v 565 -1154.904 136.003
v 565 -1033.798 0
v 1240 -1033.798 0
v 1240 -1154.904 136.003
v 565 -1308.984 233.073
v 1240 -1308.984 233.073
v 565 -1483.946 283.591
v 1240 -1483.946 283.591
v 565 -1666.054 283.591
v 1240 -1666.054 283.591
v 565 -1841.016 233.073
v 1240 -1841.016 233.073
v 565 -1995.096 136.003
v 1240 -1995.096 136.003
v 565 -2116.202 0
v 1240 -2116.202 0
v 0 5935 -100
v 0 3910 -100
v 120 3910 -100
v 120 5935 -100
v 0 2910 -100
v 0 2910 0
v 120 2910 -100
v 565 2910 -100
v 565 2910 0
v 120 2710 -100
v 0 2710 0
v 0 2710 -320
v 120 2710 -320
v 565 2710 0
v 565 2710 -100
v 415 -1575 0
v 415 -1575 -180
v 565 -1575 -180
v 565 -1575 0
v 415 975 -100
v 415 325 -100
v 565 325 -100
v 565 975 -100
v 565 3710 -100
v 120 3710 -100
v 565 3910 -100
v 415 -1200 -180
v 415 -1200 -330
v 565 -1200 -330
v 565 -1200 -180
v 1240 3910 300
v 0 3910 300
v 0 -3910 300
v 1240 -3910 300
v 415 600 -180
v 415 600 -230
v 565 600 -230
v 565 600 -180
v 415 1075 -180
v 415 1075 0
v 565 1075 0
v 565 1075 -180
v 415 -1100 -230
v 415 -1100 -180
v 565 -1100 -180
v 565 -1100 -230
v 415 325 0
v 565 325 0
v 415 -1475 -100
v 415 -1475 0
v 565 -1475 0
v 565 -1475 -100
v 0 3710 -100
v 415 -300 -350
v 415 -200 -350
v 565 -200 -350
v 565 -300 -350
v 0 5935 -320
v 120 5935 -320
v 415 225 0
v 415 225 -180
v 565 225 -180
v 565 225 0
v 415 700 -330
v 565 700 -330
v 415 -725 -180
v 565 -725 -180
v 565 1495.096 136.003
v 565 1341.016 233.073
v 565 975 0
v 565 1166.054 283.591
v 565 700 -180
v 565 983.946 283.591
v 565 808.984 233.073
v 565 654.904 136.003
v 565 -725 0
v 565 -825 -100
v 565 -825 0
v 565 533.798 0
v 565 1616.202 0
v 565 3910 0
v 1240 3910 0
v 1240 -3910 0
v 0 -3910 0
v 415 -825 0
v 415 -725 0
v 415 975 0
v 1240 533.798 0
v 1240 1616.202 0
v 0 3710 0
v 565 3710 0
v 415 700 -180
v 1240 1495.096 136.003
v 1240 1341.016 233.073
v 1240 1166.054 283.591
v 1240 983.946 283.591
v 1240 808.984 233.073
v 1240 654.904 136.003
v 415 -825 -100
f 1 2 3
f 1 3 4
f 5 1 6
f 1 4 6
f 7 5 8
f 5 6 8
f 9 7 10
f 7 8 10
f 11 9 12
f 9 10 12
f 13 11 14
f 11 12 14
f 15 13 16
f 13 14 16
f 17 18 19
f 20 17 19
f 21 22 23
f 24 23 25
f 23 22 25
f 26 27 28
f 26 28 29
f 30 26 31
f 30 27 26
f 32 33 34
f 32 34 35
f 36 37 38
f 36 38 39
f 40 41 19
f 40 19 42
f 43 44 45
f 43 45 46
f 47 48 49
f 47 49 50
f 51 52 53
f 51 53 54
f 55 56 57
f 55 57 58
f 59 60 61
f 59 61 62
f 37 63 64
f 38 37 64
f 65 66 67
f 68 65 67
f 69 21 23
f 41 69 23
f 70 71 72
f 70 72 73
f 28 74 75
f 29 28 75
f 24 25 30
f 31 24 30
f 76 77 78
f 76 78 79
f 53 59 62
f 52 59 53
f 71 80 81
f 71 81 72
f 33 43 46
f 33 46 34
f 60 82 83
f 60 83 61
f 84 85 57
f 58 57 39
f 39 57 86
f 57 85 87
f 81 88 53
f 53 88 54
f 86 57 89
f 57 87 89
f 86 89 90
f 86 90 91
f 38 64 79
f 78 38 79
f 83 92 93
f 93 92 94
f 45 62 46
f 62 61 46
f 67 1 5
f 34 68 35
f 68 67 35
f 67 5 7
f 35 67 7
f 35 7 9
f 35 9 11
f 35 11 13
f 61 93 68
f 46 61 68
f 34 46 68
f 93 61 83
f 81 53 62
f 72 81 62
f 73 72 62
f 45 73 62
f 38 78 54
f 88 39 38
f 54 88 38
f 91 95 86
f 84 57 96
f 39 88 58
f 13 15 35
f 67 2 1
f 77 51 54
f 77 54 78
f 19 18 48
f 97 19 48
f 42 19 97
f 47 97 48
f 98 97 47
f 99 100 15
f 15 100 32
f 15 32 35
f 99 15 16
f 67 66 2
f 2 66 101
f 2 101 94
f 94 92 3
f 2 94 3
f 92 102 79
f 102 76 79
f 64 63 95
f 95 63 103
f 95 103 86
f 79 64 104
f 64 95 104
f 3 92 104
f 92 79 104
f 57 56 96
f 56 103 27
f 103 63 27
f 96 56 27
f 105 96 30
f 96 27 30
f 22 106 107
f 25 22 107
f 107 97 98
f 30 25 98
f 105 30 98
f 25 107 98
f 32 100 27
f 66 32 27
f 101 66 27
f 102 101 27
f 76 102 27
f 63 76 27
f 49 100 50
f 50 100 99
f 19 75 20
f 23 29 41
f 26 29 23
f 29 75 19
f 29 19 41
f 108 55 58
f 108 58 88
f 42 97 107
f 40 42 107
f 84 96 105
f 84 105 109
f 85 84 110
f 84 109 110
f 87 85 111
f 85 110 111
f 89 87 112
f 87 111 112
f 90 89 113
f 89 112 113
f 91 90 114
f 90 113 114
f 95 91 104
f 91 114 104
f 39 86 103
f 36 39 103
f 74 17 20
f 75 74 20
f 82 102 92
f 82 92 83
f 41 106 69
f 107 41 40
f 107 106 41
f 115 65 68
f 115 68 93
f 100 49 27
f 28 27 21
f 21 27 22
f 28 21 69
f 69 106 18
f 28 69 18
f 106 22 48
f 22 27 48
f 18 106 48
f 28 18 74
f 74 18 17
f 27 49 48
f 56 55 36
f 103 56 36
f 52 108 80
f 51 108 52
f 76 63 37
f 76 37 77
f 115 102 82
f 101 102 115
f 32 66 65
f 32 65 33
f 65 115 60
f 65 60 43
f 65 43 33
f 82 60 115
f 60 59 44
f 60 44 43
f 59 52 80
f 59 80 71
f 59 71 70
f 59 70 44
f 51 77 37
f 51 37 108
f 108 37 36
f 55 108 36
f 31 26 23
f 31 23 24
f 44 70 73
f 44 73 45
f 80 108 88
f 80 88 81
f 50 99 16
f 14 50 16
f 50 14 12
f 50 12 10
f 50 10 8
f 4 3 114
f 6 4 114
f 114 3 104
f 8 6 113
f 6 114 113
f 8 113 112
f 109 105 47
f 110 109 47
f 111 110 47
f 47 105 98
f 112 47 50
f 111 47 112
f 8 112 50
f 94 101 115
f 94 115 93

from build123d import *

# Parameters (mm, degrees)
F0_W      = 2480
F0_H      = 7820
F1_DEPTH  = 300
F2_W      = 1130
F2_H      = 200
F2_W_2    = 150
F2_H_2    = 100
F2_W_3    = 75
F3_DEPTH  = 100
F4_W      = 240
F4_H      = 220
F5_DEPTH  = 3225
F6_R      = 650
F7_DEPTH  = 675
F8_W      = 1240
F8_H      = 2025
F8_H_2    = 7820
F9_DEPTH  = 1420
F11_DEPTH = 150


with BuildPart() as f1:
    # F0 (on Top) → F1 (new body)
    with BuildSketch(Plane.XY):
        Rectangle(F0_W, F0_H)
    extrude(amount=F1_DEPTH)

    # F2 (on face) → F3 (join)
    with BuildSketch(Plane(origin=(0, 0, 0), x_dir=(1, 0, 0), z_dir=(0, 0, -1))):
        with Locations((0, -2810)):
            Rectangle(F2_W, F2_H)
        with Locations((0, -3810)):
            Rectangle(F2_W, F2_H)
        with Locations((-490, -1025)):
            Rectangle(F2_W_2, F2_H_2)
        with Locations((452.5, -1025)):
            Rectangle(F2_W_3, F2_H_2)
        with Locations((527.5, -1025)):
            Rectangle(F2_W_3, F2_H_2)
        with Locations((490, 1525)):
            Rectangle(F2_W_2, F2_H_2)
        with Locations((-490, 1525)):
            Rectangle(F2_W_2, F2_H_2)
        with Locations((-490, -275)):
            Rectangle(F2_W_2, F2_H_2)
        with Locations((452.5, -275)):
            Rectangle(F2_W_3, F2_H_2)
        with Locations((527.5, -275)):
            Rectangle(F2_W_3, F2_H_2)
        with Locations((490, 775)):
            Rectangle(F2_W_2, F2_H_2)
        with Locations((-490, 775)):
            Rectangle(F2_W_2, F2_H_2)
    extrude(amount=F3_DEPTH)

    # F4 (on face) → F5 (join)
    with BuildSketch(Plane.XZ.offset(-2710)):
        with Locations((0, -210)):
            Rectangle(F4_W, F4_H)
    extrude(amount=-F5_DEPTH)

    # F6 (on face) → F7 (cut, through all)
    with BuildSketch(Plane.YZ.offset(1240)):
        with Locations((-1575, -360)):
            Circle(F6_R)
        with Locations((1075, -360)):
            Circle(F6_R)
    extrude(amount=-F7_DEPTH, mode=Mode.SUBTRACT)

    # F8 (on face) → F9 (cut)
    with BuildSketch(Plane.XY.offset(300)):
        with Locations((-620, 4922.5)):
            Rectangle(F8_W, F8_H)
        with Locations((-620, 0)):
            Rectangle(F8_W, F8_H_2)
    extrude(amount=-F9_DEPTH, mode=Mode.SUBTRACT)

    # F10 (on face) → F11 (join, through all)
    with BuildSketch(Plane(origin=(415, 0, 0), x_dir=(0, -1, 0), z_dir=(-1, 0, 0))):
        Polygon((1575, -100), (725, -100), (725, -180), (1100, -180), (1200, -180), (1575, -180), align=None)
        Polygon((-700, -180), (-600, -180), (-225, -180), (-225, -100), (-975, -100), (-1075, -100), (-1075, -180), align=None)
        Polygon((1200, -180), (1100, -180), (1100, -230), (-600, -230), (-600, -180), (-700, -180), (-700, -330), (200, -350), (300, -350), (1200, -330), align=None)
    extrude(amount=-F11_DEPTH)


solid = f1.part
